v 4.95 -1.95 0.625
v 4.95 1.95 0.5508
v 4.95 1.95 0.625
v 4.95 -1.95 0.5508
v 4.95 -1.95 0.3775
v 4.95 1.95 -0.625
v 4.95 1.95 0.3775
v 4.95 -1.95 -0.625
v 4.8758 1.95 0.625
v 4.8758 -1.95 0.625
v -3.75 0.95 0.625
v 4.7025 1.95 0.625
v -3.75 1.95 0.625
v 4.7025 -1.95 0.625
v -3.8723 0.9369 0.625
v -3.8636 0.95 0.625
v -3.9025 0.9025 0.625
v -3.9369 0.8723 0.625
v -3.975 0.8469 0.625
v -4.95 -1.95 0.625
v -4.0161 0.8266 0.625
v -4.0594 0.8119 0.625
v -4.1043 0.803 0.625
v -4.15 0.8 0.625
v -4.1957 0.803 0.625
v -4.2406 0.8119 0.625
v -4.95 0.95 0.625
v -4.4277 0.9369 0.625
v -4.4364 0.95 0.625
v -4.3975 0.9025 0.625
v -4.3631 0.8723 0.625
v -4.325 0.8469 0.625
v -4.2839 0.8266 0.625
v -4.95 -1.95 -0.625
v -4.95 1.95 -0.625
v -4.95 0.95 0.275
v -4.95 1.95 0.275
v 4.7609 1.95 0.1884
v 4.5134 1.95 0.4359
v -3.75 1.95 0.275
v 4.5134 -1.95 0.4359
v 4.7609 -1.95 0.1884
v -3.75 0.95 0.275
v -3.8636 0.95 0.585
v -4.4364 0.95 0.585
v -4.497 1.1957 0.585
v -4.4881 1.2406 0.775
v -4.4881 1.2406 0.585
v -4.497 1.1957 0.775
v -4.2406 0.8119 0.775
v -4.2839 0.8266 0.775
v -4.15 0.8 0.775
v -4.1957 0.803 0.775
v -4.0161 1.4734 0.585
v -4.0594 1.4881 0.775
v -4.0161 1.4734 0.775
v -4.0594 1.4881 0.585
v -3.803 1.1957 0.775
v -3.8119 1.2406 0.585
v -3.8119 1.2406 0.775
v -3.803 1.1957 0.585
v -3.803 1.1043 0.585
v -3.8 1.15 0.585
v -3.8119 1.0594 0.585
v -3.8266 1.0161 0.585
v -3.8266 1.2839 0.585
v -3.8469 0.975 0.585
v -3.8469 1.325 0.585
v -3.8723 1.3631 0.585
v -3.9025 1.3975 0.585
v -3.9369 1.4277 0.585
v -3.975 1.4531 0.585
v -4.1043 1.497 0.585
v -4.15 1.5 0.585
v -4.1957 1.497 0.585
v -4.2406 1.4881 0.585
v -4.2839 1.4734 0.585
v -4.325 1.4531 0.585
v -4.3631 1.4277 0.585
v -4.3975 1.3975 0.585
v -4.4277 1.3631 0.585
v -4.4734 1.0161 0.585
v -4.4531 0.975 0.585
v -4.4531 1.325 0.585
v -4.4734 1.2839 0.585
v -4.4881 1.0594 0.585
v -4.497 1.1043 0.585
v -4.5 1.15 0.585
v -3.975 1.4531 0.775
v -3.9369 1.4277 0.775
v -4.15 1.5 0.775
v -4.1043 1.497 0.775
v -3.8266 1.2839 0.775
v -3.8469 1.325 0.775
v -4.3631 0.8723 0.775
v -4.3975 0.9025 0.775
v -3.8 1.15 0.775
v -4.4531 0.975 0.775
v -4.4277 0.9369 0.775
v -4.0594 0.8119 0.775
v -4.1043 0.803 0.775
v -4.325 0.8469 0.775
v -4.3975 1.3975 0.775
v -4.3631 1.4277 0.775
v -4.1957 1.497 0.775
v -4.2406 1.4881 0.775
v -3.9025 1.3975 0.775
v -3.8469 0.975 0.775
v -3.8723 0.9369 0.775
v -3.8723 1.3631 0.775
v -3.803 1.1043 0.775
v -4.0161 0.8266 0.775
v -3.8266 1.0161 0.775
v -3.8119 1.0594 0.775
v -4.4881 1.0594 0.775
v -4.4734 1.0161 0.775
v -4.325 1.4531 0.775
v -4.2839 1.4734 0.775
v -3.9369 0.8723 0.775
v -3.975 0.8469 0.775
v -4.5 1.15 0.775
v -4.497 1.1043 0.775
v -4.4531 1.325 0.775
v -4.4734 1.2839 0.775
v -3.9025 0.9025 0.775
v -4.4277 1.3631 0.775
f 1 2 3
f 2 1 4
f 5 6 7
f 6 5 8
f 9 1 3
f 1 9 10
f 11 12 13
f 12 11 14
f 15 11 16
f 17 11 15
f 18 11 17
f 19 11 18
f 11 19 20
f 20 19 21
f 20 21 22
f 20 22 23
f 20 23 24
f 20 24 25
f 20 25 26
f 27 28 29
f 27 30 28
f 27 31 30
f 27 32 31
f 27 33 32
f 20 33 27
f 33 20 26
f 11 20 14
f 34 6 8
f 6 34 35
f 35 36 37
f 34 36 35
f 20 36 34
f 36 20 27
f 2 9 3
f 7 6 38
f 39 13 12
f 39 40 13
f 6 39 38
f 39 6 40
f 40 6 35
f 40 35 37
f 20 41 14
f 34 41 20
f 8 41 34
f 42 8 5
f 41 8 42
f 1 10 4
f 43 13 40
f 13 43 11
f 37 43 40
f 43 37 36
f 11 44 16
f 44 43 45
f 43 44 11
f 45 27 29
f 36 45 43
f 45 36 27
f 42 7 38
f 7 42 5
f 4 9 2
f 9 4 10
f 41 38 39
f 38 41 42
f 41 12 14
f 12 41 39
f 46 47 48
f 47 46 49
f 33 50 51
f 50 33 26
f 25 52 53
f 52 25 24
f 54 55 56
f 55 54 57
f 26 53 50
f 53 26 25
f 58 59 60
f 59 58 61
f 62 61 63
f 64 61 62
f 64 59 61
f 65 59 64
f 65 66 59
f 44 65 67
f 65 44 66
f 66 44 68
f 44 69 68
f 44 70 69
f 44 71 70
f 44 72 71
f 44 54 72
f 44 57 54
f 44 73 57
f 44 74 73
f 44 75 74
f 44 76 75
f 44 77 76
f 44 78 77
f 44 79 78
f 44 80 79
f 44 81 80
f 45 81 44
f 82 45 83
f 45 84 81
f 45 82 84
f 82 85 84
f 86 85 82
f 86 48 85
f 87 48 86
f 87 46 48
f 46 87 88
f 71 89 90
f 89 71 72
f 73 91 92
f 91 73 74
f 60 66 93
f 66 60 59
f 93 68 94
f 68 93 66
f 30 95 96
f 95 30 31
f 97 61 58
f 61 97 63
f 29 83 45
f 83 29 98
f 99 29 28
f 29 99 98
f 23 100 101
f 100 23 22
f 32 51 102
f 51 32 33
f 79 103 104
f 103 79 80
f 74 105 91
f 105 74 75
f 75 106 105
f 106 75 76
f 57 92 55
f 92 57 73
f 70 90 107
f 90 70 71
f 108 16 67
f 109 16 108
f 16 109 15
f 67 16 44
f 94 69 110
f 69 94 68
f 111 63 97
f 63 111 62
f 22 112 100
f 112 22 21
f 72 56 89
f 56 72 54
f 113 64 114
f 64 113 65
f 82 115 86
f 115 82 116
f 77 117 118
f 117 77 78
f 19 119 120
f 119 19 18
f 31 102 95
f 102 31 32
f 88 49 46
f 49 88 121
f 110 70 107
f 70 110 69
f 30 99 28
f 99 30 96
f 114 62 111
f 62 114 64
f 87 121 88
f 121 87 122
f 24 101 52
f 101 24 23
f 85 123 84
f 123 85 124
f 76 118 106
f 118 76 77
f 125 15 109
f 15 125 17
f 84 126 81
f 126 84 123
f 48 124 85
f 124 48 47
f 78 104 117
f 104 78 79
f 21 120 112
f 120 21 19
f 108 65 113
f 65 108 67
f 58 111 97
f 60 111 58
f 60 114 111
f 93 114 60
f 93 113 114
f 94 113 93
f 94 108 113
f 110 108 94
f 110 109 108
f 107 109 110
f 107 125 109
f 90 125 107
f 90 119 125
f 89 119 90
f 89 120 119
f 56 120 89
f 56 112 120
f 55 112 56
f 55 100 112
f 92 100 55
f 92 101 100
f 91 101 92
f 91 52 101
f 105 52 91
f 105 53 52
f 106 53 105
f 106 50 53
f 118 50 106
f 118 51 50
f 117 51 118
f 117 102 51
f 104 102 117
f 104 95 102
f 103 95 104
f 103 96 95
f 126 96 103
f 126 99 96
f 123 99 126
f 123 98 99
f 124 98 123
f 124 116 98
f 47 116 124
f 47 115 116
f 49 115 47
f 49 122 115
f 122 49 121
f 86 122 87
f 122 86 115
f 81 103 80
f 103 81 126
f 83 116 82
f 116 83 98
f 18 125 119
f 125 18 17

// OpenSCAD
// SMD package: exact overall dimensions [9.90, 3.90, 1.25] (L x W x H)
// One connected solid (dot is fused to body). No floating parts.

// Parameters
body_length = 9.90;
body_width  = 3.90;
body_height = 1.25;

notch_length = 1.20;
notch_width  = 1.00;
notch_depth  = 0.35;

dot_radius = 0.35;
dot_height = 0.15;
dot_edge_offset = 0.80;

chamfer_size = 0.35;

// Small overlap to guarantee manifold connectivity in unions/differences
eps = 0.02;

// Main body
module main_body() {
    cube([body_length, body_width, body_height], center=true);
}

// Marking notch (subtracted from top surface, near one corner)
module marking_notch() {
    translate([
        -body_length/2 + notch_length/2,
         body_width/2  - notch_width/2,
         body_height/2 - notch_depth/2 + eps
    ])
    cube([notch_length, notch_width, notch_depth + 2*eps], center=true);
}

// Single corner chamfer (subtracted wedge at +X edge)
module edge_chamfer() {
    translate([body_length/2 - chamfer_size/2, 0, body_height/2 - chamfer_size/2])
        rotate([0, 45, 0])
            cube([chamfer_size, body_width + 2*eps, chamfer_size + 2*eps], center=true);
}

// Pin-1 dot (added on top, fused into body by eps)
module pin1_dot() {
    translate([
        -body_length/2 + dot_edge_offset,
         body_width/2  - dot_edge_offset,
         body_height/2 + dot_height/2 - eps
    ])
    cylinder(r=dot_radius, h=dot_height + 2*eps, center=true, $fn=48);
}

// Final SMD package (single connected solid)
module smd_complete() {
    union() {
        difference() {
            main_body();
            marking_notch();
            edge_chamfer();
        }
        pin1_dot();
    }
}

smd_complete();
